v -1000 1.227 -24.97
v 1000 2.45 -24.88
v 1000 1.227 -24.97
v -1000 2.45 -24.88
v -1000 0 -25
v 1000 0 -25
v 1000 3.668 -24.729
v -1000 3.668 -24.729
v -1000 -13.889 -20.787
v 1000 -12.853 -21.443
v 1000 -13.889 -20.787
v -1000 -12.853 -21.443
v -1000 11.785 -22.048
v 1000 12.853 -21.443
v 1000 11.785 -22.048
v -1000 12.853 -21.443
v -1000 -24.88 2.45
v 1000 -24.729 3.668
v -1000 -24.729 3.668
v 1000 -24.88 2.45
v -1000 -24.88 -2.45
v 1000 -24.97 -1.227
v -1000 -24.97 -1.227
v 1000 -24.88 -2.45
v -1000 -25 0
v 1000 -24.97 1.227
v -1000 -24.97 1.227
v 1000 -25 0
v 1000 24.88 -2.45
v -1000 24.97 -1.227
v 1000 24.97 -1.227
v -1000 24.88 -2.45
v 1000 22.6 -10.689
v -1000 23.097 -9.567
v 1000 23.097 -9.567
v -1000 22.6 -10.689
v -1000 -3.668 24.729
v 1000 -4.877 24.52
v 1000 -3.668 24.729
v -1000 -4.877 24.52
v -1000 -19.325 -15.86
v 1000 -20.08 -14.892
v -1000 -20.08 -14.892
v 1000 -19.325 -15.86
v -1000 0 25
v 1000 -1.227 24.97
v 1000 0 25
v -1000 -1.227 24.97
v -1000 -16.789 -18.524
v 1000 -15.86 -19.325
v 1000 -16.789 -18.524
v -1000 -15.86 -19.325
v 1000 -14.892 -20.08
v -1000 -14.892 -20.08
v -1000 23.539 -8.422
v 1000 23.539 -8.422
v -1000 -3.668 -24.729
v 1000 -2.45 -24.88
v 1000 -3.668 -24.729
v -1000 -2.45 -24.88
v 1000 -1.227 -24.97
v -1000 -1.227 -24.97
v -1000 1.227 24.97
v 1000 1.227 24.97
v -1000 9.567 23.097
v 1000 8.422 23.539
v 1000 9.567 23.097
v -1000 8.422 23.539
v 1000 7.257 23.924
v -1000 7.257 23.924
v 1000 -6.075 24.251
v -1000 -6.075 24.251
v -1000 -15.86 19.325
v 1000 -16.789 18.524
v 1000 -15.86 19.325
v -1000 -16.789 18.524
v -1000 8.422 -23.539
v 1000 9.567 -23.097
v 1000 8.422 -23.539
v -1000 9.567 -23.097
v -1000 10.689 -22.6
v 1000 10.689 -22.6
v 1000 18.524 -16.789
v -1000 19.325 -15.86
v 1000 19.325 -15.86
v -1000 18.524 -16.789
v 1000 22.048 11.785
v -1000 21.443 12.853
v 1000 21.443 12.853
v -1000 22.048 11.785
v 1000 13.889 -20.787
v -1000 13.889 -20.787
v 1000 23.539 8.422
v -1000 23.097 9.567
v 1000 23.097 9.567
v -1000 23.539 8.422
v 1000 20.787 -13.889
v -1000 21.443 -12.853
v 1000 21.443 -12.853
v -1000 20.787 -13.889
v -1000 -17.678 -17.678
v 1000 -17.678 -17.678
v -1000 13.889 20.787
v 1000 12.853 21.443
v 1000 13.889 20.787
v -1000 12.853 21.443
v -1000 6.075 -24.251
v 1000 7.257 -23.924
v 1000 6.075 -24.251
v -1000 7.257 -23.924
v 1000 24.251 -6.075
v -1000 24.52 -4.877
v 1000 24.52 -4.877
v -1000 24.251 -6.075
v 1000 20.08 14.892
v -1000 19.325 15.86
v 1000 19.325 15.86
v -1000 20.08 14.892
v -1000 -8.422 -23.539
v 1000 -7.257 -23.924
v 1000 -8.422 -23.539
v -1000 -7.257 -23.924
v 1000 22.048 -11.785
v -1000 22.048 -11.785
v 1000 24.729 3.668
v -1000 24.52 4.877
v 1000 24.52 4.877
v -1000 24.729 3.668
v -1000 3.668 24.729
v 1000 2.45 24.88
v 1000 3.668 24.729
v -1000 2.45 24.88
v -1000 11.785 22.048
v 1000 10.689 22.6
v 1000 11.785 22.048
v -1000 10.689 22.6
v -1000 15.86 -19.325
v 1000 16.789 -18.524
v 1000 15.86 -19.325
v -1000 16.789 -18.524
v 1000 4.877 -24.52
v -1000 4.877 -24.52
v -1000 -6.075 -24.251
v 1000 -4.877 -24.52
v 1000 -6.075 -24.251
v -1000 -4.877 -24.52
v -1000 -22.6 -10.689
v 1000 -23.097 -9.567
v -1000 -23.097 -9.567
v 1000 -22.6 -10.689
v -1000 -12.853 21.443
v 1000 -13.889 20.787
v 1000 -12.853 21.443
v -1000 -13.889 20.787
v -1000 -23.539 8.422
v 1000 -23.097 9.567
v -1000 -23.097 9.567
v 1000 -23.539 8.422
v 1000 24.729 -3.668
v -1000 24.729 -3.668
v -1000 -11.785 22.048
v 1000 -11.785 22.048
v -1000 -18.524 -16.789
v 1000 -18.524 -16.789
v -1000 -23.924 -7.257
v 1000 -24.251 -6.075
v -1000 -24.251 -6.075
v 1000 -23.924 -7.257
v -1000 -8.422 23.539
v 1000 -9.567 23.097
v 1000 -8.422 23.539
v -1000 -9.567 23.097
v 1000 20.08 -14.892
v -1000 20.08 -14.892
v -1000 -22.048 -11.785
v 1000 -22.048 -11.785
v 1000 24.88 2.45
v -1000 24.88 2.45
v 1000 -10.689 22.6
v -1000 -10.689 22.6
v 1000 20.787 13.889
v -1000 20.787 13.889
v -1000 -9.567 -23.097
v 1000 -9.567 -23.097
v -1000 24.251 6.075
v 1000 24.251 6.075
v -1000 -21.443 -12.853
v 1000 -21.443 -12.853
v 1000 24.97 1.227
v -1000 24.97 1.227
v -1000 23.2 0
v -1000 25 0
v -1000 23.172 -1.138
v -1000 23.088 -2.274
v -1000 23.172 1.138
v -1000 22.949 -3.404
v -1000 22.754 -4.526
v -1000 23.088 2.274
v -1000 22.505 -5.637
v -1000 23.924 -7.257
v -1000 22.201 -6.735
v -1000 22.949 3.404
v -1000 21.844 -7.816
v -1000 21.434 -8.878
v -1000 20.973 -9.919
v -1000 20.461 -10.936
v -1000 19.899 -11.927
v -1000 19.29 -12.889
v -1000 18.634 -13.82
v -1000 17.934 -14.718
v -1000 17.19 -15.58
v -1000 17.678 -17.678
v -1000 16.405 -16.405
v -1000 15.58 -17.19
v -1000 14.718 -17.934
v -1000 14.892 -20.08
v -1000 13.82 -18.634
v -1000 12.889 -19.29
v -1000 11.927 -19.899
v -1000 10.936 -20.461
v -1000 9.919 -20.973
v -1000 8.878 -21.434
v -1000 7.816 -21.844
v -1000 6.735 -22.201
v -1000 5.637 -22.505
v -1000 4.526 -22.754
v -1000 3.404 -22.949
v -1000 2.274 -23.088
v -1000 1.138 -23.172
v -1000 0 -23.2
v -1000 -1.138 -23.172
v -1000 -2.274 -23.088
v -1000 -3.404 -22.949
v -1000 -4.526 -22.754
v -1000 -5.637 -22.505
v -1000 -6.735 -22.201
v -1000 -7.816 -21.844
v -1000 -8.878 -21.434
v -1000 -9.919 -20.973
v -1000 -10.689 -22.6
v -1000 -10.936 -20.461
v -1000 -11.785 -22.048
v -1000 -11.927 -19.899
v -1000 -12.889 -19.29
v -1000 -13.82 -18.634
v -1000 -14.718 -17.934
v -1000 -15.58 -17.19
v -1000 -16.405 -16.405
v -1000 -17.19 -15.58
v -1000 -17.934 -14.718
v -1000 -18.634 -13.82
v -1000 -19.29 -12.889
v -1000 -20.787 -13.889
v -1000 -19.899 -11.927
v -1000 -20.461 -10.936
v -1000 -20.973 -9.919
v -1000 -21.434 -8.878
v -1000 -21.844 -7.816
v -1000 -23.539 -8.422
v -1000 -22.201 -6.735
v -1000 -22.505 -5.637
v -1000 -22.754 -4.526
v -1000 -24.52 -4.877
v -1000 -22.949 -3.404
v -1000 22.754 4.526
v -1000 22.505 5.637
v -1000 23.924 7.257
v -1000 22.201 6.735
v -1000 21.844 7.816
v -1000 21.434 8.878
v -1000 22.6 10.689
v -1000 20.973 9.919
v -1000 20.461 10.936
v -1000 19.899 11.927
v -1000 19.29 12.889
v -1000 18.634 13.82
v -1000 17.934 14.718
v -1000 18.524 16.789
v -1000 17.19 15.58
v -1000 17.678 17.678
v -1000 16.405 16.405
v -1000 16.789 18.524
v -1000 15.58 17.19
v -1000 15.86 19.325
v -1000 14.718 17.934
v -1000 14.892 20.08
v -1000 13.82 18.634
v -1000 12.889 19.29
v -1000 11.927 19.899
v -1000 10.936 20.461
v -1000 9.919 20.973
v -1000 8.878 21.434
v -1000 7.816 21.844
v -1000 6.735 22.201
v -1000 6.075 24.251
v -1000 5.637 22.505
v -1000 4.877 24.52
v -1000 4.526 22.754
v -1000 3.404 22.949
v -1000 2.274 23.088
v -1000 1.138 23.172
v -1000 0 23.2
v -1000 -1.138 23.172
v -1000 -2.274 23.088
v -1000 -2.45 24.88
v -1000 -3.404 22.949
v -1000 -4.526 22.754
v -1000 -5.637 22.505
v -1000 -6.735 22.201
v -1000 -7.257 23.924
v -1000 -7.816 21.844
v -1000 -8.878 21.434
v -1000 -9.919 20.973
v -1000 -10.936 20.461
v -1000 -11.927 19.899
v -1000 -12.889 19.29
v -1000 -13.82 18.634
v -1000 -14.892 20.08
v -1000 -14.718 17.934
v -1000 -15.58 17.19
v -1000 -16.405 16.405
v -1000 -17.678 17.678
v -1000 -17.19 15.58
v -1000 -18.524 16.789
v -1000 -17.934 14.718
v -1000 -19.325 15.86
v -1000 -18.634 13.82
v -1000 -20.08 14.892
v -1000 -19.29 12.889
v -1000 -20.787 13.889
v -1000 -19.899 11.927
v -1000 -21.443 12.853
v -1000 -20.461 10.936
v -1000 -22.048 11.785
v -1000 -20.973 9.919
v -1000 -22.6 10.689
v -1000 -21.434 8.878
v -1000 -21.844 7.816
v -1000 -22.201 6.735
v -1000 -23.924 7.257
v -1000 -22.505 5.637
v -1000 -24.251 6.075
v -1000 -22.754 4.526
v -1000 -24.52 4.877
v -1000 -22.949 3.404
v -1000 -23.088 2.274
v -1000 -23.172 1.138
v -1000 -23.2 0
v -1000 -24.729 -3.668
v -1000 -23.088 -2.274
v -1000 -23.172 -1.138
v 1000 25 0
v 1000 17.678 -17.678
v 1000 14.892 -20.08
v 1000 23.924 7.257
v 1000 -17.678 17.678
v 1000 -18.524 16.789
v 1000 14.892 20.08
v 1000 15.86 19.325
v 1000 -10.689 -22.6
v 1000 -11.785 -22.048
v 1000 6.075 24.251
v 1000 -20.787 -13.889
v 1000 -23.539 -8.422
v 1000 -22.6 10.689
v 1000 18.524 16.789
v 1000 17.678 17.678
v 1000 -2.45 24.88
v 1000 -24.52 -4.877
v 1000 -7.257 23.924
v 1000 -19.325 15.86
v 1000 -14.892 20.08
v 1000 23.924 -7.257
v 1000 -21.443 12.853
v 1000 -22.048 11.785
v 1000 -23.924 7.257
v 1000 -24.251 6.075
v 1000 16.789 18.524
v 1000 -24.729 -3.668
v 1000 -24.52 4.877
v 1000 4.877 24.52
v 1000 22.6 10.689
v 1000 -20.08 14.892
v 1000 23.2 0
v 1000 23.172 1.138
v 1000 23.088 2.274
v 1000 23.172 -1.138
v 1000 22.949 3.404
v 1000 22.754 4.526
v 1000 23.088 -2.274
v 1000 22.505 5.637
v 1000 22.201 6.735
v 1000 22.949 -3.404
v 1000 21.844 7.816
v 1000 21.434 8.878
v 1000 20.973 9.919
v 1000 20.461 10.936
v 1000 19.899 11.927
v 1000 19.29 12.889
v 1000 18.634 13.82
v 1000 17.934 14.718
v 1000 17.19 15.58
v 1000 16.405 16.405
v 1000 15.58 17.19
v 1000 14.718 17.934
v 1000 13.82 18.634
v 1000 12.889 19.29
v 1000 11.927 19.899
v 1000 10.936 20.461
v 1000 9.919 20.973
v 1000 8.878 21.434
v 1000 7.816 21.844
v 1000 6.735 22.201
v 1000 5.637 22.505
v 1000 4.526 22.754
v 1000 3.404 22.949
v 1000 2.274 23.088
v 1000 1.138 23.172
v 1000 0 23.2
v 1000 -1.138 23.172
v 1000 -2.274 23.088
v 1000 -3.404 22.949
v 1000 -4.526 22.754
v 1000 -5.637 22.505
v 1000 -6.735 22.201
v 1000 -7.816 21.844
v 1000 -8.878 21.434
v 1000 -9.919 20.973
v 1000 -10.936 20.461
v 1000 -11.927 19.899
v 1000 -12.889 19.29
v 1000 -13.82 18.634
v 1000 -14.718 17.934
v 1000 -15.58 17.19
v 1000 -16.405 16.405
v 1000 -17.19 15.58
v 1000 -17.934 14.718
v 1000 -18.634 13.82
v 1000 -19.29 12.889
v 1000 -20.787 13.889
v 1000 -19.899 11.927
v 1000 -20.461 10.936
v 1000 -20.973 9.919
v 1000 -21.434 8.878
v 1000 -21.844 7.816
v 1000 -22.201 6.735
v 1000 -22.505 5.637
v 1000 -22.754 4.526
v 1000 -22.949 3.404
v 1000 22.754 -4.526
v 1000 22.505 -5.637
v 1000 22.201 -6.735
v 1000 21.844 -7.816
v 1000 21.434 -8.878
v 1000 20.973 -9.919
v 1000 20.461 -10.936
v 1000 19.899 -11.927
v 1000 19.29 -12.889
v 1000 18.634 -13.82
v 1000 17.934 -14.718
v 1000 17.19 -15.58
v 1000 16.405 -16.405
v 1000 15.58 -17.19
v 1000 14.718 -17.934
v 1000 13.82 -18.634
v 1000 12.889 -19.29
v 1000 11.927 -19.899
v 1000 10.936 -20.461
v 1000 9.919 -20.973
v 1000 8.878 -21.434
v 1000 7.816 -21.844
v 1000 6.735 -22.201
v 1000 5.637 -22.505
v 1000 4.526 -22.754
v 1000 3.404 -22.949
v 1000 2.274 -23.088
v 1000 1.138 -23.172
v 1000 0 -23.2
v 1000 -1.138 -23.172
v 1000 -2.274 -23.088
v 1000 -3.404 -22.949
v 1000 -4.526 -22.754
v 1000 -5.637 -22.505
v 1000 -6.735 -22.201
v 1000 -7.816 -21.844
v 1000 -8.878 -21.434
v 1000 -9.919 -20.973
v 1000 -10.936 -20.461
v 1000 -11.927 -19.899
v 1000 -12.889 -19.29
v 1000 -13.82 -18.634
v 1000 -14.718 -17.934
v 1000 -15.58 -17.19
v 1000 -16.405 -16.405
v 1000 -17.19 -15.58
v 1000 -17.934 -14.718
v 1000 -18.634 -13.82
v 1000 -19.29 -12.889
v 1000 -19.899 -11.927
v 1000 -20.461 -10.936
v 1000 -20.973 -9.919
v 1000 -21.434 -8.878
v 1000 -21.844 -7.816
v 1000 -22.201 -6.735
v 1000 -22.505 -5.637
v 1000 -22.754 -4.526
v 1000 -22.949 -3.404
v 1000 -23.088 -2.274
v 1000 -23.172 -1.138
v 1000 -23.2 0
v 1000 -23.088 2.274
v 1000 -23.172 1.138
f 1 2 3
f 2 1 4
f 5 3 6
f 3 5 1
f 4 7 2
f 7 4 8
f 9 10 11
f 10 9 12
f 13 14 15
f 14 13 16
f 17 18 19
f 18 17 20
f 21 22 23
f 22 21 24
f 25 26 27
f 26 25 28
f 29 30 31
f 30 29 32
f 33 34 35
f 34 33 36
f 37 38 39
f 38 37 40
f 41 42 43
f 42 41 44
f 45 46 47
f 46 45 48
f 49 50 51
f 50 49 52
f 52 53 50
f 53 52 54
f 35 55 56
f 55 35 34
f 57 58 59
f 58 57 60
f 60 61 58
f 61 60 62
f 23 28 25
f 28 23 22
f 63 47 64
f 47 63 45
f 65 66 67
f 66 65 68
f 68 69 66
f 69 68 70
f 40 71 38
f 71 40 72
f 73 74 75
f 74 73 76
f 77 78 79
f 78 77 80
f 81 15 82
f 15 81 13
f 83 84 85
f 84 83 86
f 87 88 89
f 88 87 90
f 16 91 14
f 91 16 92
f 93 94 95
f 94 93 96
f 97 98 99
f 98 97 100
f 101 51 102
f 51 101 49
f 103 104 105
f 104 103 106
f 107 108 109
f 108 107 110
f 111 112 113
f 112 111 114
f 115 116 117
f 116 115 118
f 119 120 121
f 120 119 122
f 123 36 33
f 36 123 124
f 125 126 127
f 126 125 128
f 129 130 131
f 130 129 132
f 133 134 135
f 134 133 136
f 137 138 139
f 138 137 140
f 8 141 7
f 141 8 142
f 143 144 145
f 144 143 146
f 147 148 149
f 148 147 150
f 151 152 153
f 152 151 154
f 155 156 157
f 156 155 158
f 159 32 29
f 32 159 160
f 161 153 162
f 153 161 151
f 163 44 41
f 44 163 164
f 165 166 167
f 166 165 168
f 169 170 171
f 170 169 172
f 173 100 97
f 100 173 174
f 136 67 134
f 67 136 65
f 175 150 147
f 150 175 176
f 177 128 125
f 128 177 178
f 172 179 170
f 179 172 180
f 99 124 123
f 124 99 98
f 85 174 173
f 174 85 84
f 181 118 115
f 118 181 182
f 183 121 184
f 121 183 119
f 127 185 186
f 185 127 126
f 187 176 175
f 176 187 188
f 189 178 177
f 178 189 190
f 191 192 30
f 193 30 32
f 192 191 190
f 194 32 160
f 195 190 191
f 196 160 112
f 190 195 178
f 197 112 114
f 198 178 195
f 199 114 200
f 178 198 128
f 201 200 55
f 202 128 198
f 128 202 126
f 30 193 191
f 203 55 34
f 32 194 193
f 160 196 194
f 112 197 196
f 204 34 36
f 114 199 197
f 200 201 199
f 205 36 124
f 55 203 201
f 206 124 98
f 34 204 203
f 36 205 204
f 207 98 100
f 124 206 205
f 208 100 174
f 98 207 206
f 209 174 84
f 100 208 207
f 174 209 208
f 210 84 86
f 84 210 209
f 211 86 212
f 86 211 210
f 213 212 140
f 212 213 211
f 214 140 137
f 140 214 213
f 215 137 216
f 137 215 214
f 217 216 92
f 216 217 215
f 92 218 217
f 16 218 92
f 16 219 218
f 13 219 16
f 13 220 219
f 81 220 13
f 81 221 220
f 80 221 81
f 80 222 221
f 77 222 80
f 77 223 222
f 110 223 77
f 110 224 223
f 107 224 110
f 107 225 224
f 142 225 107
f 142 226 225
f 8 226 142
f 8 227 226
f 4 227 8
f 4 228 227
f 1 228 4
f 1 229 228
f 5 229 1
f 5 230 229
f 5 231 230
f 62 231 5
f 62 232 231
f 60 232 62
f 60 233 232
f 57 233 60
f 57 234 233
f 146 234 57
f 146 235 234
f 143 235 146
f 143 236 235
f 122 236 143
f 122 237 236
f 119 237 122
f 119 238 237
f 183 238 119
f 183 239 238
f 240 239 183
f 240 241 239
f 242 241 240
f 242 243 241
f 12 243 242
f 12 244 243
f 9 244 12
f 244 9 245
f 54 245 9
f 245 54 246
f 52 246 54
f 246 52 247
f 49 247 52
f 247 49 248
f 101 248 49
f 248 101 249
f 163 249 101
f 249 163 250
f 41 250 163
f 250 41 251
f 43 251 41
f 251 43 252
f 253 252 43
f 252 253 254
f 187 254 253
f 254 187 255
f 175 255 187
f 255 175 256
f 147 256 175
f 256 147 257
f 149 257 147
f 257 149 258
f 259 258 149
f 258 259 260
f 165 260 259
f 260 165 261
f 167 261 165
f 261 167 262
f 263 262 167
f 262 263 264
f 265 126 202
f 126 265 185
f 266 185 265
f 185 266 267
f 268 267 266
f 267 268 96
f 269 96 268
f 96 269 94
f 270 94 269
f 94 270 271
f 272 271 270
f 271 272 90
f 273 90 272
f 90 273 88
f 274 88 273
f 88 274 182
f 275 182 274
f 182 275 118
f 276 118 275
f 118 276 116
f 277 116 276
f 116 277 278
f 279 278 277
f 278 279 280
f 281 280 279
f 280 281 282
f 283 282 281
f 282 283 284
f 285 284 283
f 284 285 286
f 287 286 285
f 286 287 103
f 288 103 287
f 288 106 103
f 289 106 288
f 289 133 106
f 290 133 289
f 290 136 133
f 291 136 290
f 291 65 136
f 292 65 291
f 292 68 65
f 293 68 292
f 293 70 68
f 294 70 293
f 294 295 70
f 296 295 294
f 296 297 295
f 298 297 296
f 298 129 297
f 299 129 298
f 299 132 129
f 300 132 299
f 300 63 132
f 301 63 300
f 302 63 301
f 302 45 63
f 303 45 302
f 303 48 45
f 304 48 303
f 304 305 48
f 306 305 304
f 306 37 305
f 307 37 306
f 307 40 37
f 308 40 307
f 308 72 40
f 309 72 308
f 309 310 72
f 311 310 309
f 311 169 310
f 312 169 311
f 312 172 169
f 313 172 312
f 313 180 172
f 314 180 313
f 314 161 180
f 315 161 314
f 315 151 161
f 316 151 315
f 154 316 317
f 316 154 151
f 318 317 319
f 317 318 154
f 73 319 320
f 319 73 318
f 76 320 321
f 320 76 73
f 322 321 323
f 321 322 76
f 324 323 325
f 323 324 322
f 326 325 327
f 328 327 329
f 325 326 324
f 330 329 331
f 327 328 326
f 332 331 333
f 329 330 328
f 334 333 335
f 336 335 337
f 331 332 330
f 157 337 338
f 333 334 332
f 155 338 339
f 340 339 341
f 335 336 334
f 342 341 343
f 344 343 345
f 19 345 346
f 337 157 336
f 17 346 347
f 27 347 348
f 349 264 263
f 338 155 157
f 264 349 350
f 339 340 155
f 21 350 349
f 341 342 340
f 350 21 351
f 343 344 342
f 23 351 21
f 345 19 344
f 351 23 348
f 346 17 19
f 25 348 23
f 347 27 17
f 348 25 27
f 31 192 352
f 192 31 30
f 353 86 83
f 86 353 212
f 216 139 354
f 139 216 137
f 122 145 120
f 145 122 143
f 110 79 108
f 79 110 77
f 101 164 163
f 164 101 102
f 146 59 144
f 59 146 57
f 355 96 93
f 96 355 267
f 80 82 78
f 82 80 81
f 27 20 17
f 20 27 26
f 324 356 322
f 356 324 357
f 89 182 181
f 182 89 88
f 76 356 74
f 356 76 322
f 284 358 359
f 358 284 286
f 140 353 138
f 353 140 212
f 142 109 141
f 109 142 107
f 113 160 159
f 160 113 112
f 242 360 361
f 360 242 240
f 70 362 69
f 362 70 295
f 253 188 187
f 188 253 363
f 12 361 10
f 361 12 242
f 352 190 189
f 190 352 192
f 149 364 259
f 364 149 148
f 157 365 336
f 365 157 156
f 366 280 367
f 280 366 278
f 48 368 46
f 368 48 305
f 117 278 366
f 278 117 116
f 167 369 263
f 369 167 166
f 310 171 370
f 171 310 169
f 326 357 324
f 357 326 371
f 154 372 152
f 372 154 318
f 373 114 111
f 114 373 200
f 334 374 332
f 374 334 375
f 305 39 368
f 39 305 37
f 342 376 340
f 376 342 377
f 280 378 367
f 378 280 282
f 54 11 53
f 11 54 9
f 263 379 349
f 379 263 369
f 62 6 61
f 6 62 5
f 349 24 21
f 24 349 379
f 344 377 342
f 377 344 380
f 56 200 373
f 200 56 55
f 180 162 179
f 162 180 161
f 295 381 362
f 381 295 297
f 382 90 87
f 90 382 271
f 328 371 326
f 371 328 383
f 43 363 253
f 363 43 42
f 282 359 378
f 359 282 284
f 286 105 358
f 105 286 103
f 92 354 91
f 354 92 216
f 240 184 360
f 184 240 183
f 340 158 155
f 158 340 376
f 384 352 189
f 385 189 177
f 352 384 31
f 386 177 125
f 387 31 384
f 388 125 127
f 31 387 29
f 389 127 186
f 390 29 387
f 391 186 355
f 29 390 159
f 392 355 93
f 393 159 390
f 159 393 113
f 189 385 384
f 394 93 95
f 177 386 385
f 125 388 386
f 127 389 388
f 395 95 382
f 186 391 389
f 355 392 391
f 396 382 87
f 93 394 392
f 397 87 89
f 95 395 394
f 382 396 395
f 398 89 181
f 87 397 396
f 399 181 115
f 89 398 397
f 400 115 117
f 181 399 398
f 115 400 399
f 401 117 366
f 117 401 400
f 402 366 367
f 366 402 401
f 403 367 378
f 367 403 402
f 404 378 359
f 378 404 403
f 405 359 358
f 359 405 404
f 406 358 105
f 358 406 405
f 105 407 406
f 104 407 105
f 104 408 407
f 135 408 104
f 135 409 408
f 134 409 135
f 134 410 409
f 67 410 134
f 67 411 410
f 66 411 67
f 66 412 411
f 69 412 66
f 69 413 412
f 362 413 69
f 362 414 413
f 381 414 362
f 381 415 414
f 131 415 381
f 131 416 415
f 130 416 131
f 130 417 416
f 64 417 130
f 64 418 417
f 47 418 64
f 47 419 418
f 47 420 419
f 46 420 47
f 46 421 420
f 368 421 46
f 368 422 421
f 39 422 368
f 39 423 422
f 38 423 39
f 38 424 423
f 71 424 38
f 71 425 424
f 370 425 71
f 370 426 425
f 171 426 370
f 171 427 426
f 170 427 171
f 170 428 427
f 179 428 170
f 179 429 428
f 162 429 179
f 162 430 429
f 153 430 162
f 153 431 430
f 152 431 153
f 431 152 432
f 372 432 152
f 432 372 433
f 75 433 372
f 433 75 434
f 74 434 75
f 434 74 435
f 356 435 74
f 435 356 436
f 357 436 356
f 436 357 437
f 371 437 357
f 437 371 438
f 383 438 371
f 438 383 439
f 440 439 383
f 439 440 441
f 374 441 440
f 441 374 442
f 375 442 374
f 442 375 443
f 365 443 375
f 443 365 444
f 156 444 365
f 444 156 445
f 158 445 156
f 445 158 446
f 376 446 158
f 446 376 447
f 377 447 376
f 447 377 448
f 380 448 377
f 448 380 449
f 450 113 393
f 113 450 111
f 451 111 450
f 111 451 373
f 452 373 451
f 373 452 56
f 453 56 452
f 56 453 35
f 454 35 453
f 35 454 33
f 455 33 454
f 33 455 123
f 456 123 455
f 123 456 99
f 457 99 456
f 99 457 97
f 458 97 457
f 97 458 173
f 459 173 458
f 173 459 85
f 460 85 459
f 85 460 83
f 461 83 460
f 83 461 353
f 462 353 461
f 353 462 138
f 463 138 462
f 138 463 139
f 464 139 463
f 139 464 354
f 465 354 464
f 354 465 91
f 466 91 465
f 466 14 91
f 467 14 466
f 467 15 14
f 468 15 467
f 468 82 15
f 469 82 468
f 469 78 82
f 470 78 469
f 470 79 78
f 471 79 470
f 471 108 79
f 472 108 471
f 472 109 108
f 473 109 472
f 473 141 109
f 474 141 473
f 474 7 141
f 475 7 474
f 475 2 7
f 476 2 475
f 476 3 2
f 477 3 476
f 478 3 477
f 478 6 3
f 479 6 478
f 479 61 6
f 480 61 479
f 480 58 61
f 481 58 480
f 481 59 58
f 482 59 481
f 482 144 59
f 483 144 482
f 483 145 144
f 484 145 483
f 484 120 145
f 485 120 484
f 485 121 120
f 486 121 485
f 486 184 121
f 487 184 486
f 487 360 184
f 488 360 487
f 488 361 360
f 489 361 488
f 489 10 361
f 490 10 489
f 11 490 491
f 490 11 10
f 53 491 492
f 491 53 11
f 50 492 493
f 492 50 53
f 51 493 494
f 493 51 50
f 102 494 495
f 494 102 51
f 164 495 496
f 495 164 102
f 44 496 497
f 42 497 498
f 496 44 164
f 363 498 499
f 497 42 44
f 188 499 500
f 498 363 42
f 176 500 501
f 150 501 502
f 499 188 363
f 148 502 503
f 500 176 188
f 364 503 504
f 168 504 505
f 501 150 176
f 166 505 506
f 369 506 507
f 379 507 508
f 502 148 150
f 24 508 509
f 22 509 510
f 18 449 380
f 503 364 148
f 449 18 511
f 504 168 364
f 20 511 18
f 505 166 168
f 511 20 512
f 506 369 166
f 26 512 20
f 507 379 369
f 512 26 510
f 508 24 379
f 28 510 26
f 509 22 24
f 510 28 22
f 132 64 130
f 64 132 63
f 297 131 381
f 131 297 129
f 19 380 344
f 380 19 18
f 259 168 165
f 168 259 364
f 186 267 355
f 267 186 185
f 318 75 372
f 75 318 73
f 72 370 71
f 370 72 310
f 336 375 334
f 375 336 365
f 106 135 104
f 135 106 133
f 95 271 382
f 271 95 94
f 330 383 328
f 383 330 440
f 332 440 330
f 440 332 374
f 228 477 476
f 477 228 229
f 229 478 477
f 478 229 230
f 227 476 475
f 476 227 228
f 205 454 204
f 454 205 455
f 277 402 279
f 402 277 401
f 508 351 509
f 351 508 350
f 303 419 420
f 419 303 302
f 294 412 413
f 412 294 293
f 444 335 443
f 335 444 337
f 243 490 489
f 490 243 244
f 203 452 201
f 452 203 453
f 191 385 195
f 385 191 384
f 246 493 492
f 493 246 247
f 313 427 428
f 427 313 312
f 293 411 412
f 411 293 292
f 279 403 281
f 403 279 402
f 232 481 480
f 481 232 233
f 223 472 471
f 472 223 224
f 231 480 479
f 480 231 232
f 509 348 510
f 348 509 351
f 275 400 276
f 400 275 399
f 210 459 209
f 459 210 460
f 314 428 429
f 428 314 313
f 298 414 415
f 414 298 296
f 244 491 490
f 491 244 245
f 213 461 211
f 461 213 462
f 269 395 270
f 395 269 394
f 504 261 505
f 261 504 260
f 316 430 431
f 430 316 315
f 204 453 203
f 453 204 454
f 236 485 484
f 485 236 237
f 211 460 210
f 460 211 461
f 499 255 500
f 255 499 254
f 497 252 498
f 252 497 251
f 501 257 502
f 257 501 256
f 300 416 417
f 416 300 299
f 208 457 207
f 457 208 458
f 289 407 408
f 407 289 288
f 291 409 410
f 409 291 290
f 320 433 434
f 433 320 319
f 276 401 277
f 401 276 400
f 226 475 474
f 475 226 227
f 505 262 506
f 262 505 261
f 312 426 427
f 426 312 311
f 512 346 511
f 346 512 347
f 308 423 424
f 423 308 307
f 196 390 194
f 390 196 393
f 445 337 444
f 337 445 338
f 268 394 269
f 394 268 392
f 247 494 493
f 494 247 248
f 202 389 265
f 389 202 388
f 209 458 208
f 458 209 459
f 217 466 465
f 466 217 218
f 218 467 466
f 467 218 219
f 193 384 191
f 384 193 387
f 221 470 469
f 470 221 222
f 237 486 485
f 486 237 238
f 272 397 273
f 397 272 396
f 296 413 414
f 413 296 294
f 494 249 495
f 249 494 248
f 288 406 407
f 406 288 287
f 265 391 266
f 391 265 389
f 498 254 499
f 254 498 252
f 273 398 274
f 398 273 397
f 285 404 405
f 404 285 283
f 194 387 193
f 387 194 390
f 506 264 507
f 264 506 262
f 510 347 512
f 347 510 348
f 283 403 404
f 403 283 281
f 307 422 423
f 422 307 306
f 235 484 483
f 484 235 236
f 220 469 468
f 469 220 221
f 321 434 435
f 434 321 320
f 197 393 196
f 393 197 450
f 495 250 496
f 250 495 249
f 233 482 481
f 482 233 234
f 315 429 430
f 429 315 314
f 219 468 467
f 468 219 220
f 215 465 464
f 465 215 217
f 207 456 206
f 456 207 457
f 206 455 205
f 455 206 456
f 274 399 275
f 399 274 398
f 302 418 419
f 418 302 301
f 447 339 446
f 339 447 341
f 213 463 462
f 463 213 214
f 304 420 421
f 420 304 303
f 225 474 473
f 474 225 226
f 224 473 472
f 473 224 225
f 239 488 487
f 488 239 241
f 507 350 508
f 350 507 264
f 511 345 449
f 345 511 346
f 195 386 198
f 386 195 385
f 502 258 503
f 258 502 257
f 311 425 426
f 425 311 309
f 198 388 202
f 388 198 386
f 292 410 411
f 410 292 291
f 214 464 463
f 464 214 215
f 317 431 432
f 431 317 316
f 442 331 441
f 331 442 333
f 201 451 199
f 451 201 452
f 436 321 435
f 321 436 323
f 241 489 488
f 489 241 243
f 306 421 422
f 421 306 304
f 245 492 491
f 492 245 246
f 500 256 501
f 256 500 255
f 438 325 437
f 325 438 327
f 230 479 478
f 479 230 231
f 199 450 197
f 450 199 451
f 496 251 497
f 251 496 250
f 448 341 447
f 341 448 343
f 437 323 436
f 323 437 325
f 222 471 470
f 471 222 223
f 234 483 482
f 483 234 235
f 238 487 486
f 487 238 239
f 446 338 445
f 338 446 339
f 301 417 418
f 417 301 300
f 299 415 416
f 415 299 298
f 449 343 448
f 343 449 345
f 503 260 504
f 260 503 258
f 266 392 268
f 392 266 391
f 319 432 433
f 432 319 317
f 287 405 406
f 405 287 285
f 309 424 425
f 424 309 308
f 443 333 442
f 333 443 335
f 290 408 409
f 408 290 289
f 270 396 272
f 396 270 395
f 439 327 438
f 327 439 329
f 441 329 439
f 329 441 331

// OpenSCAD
$fn = 128;

// HT 50 pipe: OD 50 mm, wall 1.8 mm, length 2000 mm
pipe_length = 2000;
outer_d = 50;
wall = 1.8;
inner_d = outer_d - 2*wall;

eps = 0.2; // small overlap to ensure clean boolean

// Orient along X so front/back/left/right orthographic views show the pipe length
rotate([0, 90, 0])
difference() {
    cylinder(h = pipe_length, d = outer_d, center = true);
    cylinder(h = pipe_length + 2*eps, d = inner_d, center = true);
}
